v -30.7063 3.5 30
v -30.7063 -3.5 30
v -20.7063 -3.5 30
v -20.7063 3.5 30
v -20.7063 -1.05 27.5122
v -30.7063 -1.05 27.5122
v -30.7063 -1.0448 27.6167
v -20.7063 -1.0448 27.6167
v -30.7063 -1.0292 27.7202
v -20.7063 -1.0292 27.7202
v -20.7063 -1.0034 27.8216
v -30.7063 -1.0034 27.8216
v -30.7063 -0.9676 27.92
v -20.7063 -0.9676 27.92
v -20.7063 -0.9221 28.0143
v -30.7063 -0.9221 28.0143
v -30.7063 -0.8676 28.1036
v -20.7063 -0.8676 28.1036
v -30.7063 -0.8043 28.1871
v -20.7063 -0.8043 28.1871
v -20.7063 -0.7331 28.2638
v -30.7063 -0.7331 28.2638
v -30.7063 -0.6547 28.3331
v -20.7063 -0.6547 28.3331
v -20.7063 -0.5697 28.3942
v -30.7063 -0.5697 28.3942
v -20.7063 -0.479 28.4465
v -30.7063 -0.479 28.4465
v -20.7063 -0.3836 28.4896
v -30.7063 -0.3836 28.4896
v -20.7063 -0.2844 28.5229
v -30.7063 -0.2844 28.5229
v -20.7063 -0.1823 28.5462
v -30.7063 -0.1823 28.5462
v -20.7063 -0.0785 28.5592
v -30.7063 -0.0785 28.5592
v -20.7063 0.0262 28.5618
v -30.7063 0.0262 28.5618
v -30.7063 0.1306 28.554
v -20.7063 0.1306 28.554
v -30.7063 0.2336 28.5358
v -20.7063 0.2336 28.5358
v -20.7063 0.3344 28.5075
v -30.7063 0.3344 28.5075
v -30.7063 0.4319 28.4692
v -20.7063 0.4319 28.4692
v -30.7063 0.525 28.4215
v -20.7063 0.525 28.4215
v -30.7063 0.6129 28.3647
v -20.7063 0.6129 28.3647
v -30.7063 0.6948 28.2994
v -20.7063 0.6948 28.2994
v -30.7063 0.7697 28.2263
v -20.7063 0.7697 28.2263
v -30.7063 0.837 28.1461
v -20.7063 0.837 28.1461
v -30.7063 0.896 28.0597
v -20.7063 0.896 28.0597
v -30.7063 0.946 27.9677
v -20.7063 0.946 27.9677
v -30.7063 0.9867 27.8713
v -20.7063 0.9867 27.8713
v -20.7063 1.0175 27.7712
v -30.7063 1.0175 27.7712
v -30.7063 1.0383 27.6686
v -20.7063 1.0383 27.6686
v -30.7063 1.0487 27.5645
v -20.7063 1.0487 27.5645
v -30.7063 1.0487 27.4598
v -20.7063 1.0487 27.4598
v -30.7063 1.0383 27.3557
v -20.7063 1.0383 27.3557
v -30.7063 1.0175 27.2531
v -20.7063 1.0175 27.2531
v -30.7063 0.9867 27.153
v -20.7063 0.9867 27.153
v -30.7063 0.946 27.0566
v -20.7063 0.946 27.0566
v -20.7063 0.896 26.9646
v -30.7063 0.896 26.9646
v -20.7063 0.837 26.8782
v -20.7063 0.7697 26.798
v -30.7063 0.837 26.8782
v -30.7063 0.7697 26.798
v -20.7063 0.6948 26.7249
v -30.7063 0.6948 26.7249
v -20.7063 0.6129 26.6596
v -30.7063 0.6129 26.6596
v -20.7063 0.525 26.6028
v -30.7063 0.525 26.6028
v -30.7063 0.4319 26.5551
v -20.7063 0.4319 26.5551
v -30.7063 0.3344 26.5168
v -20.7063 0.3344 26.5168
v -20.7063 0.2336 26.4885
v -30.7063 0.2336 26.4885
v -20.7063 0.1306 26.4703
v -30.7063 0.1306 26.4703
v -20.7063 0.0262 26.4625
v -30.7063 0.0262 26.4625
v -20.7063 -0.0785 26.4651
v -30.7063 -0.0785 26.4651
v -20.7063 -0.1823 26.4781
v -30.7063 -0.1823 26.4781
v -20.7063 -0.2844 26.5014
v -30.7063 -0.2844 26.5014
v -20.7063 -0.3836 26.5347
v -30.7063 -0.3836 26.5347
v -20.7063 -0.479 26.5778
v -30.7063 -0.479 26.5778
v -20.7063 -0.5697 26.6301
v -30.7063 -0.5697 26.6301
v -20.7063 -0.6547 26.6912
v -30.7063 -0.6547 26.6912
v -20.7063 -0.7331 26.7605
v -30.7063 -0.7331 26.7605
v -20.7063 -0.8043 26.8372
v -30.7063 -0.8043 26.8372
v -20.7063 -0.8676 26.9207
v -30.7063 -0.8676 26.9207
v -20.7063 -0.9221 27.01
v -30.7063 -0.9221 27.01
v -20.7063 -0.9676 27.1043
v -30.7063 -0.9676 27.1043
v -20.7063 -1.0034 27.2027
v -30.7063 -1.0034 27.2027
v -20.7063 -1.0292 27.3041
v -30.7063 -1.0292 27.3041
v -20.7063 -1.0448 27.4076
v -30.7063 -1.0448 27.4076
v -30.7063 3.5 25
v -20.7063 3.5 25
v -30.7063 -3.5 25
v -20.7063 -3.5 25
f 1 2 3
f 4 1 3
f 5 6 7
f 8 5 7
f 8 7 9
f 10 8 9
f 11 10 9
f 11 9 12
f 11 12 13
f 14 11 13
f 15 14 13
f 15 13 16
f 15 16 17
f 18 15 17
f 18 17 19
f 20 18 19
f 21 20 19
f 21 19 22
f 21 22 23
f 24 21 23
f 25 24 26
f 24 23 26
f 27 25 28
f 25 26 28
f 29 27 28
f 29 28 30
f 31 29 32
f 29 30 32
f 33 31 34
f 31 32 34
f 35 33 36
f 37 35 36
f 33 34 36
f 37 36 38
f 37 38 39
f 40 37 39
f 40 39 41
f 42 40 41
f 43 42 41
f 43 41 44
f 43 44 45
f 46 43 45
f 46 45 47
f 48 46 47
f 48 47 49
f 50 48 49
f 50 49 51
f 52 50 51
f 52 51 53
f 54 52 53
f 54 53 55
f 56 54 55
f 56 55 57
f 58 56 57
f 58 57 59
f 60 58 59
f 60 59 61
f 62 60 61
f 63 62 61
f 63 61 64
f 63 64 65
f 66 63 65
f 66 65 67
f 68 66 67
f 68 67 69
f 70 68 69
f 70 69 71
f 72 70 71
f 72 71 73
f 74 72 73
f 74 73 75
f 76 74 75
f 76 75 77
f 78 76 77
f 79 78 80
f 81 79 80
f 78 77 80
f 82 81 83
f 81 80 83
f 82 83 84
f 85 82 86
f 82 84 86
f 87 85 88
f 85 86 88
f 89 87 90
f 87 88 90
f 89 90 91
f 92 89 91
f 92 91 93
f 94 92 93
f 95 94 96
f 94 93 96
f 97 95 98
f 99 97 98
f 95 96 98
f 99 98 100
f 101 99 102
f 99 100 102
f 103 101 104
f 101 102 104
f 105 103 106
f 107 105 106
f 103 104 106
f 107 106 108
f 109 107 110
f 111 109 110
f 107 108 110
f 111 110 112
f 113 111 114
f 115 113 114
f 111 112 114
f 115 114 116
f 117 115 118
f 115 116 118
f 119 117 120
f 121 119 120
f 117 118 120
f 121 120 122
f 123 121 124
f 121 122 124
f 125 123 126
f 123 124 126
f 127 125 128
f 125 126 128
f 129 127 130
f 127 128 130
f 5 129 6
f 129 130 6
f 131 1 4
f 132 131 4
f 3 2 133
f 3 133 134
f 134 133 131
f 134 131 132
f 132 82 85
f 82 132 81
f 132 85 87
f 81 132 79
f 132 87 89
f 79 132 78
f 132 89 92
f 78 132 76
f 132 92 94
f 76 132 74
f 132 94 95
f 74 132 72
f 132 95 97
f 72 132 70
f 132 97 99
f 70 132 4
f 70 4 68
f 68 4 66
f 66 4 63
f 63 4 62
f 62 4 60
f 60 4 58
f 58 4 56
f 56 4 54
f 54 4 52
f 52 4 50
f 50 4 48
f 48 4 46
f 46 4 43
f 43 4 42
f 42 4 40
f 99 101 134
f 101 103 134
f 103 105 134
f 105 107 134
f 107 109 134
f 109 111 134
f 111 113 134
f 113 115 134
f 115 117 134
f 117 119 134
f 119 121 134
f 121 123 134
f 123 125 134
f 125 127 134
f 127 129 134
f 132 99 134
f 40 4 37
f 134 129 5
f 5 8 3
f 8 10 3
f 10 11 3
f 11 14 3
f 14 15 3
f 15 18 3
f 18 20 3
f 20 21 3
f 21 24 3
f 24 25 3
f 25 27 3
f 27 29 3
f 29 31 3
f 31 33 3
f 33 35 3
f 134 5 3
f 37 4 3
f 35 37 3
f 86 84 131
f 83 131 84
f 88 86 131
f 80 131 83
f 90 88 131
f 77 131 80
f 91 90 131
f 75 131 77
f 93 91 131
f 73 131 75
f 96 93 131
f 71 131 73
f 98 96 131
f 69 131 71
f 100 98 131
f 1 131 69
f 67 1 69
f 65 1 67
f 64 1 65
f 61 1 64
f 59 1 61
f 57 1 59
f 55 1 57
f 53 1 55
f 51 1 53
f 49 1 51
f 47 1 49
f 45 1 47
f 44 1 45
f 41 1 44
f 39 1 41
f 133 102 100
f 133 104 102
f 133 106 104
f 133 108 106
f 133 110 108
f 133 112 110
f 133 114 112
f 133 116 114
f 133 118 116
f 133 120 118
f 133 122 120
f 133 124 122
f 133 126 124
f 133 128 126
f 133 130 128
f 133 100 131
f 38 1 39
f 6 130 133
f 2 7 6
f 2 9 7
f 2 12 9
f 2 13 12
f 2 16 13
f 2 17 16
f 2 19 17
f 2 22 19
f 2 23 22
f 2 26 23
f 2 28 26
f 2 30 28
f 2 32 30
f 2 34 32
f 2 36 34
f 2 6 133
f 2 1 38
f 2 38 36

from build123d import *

# Parameters (mm, degrees)
SKETCH007_R      = 1.05
EXTRUDE006_DEPTH = 20
SKETCH009_W      = 10
SKETCH009_H      = 7
EXTRUDE007_DEPTH = 5


with BuildPart() as extrude006:
    # Sketch007 → Extrude006 (new body)
    with BuildSketch(Plane(origin=(-30.396078, 0, 0), x_dir=(0, -1, 0), z_dir=(-1, 0, 0))):
        with Locations((0, 27.512153)):
            Circle(SKETCH007_R)
    extrude(amount=-EXTRUDE006_DEPTH)


with BuildPart() as extrude006_1:
    # Extrude006 placement: moved
    add(extrude006.part.moved(Location((-1, 0, 0))))


with BuildPart() as cut001:
    # Sketch009 (on Face4 of Cut) → Extrude007 (new body)
    with BuildSketch(Plane(origin=(0, 0, 30), x_dir=(1, 0, 0), z_dir=(0, 0, -1))):
        with Locations((-25.706279, 0)):
            Rectangle(SKETCH009_W, SKETCH009_H)
    extrude(amount=EXTRUDE007_DEPTH)

    # Cut001: cut Extrude006
    add(extrude006_1.part, mode=Mode.SUBTRACT)


solid = cut001.part
